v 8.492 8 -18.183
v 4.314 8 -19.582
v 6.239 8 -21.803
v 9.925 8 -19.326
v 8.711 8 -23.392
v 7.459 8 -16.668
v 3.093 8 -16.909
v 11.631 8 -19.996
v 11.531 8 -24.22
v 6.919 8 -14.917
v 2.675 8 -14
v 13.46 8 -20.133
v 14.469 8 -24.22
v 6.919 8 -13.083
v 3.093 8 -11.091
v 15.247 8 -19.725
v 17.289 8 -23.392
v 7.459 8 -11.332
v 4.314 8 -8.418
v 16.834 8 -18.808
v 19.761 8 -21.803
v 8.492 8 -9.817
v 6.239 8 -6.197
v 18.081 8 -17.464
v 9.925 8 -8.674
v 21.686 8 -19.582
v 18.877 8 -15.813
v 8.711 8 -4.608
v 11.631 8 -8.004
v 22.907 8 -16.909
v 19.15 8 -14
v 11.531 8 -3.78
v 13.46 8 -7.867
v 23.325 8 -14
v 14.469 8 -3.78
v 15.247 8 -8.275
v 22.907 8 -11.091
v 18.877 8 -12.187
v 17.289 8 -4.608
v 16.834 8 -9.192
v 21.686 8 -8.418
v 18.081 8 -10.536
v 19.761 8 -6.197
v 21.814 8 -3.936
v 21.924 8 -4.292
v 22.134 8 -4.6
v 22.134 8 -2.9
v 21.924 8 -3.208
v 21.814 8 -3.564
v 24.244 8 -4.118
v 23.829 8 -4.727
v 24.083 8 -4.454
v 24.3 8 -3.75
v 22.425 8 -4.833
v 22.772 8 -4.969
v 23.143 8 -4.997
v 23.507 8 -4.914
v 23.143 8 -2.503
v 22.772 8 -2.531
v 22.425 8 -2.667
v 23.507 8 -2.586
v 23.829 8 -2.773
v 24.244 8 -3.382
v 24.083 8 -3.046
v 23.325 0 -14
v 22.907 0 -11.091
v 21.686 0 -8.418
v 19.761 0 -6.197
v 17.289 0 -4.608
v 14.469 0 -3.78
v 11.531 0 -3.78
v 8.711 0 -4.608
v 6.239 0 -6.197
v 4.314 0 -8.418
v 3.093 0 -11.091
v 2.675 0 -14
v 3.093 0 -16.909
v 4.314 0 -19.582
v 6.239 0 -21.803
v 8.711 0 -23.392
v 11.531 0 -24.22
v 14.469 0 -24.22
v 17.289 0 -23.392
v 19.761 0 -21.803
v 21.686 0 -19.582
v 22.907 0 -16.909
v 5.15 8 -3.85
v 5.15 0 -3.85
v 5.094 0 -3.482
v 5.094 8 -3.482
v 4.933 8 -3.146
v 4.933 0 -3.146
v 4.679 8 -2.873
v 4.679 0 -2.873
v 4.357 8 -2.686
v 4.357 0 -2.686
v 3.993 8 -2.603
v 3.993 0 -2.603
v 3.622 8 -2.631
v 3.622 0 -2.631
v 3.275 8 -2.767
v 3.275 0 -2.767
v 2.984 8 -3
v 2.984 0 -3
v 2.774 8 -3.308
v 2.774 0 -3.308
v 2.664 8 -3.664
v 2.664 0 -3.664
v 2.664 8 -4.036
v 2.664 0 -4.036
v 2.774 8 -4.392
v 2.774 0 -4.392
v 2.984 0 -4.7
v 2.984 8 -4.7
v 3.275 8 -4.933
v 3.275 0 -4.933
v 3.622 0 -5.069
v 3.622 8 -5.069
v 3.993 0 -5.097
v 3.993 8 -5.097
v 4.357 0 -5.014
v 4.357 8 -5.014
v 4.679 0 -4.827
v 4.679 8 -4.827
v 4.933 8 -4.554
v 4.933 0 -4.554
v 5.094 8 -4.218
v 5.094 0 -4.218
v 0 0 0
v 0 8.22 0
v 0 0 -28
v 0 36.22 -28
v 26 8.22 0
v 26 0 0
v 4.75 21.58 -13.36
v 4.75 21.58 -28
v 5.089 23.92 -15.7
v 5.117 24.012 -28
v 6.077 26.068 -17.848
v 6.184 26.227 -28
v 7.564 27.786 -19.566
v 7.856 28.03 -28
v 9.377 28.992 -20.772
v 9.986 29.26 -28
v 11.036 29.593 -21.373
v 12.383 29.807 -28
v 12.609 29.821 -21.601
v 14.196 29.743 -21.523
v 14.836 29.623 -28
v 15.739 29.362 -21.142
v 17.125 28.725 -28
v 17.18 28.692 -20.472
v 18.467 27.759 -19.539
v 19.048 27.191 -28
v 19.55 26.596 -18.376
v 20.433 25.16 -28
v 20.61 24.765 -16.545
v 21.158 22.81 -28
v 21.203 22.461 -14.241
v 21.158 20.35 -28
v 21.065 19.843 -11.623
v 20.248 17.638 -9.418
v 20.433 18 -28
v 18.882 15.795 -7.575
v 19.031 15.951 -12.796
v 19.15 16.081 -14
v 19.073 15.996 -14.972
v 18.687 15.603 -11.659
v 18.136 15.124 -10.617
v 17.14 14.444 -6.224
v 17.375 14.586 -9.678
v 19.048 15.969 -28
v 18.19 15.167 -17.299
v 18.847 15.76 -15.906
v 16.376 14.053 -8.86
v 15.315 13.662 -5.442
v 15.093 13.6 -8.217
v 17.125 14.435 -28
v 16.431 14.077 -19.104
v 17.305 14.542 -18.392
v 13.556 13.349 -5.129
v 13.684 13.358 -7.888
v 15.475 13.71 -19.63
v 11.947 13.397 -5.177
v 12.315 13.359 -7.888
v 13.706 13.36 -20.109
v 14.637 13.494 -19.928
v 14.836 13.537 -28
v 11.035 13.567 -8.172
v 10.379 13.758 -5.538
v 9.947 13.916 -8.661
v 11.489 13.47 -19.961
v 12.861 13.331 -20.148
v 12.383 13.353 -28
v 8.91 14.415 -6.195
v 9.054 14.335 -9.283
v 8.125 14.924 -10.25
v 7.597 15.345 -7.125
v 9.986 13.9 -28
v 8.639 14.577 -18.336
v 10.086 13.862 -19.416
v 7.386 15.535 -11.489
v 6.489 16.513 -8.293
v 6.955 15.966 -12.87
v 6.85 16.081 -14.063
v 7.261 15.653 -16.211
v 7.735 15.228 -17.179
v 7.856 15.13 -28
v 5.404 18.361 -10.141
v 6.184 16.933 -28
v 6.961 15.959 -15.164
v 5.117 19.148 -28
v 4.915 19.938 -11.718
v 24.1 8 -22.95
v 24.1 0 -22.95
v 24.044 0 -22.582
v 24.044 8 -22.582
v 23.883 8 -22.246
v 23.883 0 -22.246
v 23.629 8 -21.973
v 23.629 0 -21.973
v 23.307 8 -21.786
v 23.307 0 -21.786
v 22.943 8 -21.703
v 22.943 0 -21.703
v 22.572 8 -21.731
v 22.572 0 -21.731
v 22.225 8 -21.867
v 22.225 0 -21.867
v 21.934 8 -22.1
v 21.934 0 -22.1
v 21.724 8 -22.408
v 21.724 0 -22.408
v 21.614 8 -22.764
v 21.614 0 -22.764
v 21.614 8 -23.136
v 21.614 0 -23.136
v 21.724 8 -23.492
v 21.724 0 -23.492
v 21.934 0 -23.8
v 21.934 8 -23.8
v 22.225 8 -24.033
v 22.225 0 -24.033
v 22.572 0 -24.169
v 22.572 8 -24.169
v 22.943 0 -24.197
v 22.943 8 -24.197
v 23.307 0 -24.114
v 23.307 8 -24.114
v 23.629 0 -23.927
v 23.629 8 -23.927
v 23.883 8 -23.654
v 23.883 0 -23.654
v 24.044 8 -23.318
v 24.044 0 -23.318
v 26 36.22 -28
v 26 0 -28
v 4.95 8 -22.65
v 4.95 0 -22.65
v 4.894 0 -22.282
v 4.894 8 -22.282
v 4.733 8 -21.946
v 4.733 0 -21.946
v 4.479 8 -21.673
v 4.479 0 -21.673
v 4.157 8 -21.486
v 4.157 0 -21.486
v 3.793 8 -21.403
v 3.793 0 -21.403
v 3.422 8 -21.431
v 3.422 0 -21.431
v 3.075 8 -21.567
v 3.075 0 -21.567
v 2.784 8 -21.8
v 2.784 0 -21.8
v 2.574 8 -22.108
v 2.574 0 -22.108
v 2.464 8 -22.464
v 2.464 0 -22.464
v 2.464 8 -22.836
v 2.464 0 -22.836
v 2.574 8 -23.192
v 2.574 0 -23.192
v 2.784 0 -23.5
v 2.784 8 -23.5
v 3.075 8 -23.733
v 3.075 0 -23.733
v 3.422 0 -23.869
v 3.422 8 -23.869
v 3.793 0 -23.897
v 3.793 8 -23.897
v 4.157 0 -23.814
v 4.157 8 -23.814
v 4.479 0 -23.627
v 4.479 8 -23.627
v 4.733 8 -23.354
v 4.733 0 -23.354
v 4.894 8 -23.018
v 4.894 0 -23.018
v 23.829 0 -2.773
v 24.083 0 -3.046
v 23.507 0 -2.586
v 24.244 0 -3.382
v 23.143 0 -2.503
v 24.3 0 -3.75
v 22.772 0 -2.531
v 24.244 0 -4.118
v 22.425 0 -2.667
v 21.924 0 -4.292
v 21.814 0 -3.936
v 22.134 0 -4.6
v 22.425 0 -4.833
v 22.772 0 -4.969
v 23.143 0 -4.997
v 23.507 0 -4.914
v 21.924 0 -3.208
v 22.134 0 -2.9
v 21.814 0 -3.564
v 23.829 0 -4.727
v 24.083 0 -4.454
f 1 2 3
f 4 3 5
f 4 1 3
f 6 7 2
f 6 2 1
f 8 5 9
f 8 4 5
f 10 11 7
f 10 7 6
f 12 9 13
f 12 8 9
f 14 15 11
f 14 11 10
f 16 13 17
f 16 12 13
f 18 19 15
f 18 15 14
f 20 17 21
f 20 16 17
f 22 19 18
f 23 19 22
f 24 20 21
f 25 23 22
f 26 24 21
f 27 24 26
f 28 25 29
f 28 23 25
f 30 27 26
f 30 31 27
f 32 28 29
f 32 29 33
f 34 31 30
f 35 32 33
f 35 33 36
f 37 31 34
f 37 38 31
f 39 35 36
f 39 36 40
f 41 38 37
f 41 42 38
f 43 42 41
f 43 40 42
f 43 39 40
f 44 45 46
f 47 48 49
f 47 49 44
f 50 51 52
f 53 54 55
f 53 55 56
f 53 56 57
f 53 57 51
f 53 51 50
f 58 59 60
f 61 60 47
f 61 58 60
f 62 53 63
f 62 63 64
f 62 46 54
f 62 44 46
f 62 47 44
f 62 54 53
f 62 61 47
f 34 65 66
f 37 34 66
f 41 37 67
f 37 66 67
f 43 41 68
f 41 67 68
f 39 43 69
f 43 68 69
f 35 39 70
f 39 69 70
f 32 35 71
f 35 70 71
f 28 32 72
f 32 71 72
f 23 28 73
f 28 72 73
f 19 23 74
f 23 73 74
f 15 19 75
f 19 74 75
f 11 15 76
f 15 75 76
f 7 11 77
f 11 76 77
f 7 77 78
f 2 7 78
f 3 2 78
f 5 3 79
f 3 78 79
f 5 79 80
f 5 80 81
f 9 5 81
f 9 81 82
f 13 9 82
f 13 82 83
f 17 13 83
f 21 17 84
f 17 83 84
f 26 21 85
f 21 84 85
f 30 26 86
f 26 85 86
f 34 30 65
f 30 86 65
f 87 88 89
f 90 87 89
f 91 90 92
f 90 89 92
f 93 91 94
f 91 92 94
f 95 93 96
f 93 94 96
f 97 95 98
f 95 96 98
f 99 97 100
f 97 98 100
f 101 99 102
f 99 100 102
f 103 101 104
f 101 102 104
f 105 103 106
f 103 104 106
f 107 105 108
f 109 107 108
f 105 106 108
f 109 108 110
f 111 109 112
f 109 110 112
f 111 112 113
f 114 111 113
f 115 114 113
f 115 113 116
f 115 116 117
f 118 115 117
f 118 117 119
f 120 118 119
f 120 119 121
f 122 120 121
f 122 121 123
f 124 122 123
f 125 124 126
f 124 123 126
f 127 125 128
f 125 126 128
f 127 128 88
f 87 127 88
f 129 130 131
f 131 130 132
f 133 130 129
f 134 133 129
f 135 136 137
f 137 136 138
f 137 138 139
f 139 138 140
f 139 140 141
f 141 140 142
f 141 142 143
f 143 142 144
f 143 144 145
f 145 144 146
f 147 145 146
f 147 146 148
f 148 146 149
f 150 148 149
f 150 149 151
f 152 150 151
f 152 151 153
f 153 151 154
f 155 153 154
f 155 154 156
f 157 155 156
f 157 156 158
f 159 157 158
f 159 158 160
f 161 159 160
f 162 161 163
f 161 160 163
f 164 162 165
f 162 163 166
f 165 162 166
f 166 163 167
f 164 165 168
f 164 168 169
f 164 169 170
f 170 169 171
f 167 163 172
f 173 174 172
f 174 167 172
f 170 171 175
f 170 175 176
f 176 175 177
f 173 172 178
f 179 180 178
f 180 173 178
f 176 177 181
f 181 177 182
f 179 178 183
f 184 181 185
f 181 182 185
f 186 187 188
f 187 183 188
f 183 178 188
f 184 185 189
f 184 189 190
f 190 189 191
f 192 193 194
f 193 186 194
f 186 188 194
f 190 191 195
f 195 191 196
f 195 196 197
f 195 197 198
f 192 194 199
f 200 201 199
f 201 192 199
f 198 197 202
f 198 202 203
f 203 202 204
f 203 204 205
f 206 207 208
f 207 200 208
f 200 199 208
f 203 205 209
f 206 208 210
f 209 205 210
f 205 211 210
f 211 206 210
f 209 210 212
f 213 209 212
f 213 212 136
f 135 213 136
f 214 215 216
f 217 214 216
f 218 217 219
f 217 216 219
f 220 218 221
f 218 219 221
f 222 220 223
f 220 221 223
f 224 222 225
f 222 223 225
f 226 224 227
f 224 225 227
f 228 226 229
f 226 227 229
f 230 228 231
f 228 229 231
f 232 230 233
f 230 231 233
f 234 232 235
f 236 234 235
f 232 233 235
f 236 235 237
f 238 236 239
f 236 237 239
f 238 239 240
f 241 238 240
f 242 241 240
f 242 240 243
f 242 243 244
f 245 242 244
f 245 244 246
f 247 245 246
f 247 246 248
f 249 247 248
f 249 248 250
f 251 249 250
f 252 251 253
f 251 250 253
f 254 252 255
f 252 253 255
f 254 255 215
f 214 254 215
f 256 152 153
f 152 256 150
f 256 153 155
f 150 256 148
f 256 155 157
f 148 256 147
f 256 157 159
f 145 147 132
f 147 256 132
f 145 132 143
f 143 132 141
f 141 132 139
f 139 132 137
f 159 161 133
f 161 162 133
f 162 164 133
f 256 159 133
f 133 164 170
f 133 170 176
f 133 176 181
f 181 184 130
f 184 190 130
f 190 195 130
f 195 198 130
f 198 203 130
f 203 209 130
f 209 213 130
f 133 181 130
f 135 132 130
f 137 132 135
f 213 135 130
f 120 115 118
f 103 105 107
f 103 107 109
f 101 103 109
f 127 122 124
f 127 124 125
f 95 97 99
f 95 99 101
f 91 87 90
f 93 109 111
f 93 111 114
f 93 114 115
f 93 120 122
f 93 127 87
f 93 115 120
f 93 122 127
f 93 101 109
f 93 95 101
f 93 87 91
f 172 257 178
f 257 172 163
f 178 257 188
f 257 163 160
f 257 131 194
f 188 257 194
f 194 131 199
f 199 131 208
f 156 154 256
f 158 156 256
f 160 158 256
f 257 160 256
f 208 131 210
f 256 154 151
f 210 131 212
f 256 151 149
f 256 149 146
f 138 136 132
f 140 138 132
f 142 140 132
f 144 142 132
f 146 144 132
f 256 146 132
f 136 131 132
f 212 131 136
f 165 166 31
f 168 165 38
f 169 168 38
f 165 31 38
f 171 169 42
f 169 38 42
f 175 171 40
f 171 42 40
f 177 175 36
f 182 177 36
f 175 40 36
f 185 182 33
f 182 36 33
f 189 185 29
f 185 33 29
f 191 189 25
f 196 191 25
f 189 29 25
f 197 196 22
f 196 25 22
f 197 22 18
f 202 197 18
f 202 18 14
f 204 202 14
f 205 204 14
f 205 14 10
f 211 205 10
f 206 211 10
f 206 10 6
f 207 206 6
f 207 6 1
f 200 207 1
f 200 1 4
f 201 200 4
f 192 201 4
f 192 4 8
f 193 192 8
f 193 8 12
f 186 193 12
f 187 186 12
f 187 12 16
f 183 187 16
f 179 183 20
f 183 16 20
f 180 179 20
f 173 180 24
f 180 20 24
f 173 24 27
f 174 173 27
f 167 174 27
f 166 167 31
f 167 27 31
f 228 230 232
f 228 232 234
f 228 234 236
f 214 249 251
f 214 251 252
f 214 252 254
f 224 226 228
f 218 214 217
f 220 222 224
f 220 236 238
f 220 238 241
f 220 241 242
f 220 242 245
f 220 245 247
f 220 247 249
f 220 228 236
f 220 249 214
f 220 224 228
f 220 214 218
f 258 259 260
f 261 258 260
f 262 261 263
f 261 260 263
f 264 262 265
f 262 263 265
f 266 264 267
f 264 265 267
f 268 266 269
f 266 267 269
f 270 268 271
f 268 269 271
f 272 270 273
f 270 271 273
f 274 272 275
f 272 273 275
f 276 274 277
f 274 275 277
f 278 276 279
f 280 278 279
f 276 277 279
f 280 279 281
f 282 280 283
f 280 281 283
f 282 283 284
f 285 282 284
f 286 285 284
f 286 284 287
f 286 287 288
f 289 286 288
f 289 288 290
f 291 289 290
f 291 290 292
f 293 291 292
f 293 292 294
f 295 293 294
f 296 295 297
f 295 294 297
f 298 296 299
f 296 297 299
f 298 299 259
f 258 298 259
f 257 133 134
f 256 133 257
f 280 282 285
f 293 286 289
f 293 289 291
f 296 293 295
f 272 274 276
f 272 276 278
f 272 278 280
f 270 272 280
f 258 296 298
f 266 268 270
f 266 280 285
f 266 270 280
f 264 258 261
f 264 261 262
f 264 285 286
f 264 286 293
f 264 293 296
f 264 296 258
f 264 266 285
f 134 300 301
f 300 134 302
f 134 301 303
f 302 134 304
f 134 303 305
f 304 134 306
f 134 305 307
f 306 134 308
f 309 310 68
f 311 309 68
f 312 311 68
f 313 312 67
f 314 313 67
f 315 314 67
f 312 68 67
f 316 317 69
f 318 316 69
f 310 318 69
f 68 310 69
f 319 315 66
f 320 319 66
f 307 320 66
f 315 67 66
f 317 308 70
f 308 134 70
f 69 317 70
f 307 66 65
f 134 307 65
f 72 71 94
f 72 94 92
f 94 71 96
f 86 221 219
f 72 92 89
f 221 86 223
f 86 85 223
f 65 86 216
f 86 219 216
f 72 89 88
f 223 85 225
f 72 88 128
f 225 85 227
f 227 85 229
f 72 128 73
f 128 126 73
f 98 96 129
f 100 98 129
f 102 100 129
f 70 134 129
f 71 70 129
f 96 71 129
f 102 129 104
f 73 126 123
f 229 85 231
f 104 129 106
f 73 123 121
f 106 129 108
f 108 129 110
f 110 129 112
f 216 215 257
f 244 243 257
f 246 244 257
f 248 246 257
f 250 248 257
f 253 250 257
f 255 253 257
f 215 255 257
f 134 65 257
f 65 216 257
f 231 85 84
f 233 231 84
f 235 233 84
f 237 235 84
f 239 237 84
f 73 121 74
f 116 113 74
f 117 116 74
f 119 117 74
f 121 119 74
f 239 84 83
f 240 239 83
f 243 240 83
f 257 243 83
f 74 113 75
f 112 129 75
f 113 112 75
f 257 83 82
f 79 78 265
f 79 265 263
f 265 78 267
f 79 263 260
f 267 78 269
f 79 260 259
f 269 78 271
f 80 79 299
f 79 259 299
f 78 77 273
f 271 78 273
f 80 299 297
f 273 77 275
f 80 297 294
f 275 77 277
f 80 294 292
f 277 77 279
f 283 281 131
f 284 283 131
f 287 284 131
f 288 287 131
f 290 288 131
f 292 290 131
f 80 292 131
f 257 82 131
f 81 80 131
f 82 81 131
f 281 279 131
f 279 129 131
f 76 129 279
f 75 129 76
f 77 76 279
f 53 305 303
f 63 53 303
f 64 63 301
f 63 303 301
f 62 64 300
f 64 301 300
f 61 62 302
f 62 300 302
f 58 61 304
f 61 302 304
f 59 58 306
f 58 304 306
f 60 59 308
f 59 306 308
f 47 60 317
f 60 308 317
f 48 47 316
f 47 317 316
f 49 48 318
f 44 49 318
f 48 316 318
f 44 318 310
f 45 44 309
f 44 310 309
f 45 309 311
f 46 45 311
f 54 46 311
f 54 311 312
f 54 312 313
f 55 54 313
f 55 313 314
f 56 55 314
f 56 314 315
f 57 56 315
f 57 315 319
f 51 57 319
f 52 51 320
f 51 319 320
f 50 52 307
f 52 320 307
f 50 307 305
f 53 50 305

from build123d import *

# Parameters (mm, degrees)
BOSS_EXTRUDE1_DEPTH = 26
SKETCH2_R           = 8.25
CUT_EXTRUDE1_DEPTH  = 29
SKETCH3_R           = 6.15
CUT_EXTRUDE2_DEPTH  = 37.22
SKETCH4_R           = 10.325
SKETCH4_R_2         = 1.25
CUT_EXTRUDE3_DEPTH  = 8


with BuildPart() as part:
    # Sketch1 → Boss-Extrude1 (new body)
    with BuildSketch(Plane(origin=(0, 0, 0), x_dir=(0, 0, -1), z_dir=(1, 0, 0))):
        Polygon((0, 0), (28, 0), (28, 36.22), (0, 8.22), align=None)
    extrude(amount=BOSS_EXTRUDE1_DEPTH)

    # Sketch2 → Cut-Extrude1 (cut, through all)
    with BuildSketch(Plane(origin=(0, 0, -28), x_dir=(-1, 0, 0), z_dir=(0, 0, -1))):
        with Locations((-13, 21.58)):
            Circle(SKETCH2_R)
    extrude(amount=-CUT_EXTRUDE1_DEPTH, mode=Mode.SUBTRACT)

    # Sketch3 → Cut-Extrude2 (cut, through all)
    with BuildSketch(Plane.XZ):
        with Locations((13, -14)):
            Circle(SKETCH3_R)
    extrude(amount=-CUT_EXTRUDE2_DEPTH, mode=Mode.SUBTRACT)

    # Sketch4 → Cut-Extrude3 (cut)
    with BuildSketch(Plane.XZ):
        with Locations((13, -14)):
            Circle(SKETCH4_R)
        with Locations((3.9, -3.85)):
            Circle(SKETCH4_R_2)
        with Locations((23.05, -3.75)):
            Circle(SKETCH4_R_2)
        with Locations((22.85, -22.95)):
            Circle(SKETCH4_R_2)
        with Locations((3.7, -22.65)):
            Circle(SKETCH4_R_2)
    extrude(amount=-CUT_EXTRUDE3_DEPTH, mode=Mode.SUBTRACT)


solid = part.part
